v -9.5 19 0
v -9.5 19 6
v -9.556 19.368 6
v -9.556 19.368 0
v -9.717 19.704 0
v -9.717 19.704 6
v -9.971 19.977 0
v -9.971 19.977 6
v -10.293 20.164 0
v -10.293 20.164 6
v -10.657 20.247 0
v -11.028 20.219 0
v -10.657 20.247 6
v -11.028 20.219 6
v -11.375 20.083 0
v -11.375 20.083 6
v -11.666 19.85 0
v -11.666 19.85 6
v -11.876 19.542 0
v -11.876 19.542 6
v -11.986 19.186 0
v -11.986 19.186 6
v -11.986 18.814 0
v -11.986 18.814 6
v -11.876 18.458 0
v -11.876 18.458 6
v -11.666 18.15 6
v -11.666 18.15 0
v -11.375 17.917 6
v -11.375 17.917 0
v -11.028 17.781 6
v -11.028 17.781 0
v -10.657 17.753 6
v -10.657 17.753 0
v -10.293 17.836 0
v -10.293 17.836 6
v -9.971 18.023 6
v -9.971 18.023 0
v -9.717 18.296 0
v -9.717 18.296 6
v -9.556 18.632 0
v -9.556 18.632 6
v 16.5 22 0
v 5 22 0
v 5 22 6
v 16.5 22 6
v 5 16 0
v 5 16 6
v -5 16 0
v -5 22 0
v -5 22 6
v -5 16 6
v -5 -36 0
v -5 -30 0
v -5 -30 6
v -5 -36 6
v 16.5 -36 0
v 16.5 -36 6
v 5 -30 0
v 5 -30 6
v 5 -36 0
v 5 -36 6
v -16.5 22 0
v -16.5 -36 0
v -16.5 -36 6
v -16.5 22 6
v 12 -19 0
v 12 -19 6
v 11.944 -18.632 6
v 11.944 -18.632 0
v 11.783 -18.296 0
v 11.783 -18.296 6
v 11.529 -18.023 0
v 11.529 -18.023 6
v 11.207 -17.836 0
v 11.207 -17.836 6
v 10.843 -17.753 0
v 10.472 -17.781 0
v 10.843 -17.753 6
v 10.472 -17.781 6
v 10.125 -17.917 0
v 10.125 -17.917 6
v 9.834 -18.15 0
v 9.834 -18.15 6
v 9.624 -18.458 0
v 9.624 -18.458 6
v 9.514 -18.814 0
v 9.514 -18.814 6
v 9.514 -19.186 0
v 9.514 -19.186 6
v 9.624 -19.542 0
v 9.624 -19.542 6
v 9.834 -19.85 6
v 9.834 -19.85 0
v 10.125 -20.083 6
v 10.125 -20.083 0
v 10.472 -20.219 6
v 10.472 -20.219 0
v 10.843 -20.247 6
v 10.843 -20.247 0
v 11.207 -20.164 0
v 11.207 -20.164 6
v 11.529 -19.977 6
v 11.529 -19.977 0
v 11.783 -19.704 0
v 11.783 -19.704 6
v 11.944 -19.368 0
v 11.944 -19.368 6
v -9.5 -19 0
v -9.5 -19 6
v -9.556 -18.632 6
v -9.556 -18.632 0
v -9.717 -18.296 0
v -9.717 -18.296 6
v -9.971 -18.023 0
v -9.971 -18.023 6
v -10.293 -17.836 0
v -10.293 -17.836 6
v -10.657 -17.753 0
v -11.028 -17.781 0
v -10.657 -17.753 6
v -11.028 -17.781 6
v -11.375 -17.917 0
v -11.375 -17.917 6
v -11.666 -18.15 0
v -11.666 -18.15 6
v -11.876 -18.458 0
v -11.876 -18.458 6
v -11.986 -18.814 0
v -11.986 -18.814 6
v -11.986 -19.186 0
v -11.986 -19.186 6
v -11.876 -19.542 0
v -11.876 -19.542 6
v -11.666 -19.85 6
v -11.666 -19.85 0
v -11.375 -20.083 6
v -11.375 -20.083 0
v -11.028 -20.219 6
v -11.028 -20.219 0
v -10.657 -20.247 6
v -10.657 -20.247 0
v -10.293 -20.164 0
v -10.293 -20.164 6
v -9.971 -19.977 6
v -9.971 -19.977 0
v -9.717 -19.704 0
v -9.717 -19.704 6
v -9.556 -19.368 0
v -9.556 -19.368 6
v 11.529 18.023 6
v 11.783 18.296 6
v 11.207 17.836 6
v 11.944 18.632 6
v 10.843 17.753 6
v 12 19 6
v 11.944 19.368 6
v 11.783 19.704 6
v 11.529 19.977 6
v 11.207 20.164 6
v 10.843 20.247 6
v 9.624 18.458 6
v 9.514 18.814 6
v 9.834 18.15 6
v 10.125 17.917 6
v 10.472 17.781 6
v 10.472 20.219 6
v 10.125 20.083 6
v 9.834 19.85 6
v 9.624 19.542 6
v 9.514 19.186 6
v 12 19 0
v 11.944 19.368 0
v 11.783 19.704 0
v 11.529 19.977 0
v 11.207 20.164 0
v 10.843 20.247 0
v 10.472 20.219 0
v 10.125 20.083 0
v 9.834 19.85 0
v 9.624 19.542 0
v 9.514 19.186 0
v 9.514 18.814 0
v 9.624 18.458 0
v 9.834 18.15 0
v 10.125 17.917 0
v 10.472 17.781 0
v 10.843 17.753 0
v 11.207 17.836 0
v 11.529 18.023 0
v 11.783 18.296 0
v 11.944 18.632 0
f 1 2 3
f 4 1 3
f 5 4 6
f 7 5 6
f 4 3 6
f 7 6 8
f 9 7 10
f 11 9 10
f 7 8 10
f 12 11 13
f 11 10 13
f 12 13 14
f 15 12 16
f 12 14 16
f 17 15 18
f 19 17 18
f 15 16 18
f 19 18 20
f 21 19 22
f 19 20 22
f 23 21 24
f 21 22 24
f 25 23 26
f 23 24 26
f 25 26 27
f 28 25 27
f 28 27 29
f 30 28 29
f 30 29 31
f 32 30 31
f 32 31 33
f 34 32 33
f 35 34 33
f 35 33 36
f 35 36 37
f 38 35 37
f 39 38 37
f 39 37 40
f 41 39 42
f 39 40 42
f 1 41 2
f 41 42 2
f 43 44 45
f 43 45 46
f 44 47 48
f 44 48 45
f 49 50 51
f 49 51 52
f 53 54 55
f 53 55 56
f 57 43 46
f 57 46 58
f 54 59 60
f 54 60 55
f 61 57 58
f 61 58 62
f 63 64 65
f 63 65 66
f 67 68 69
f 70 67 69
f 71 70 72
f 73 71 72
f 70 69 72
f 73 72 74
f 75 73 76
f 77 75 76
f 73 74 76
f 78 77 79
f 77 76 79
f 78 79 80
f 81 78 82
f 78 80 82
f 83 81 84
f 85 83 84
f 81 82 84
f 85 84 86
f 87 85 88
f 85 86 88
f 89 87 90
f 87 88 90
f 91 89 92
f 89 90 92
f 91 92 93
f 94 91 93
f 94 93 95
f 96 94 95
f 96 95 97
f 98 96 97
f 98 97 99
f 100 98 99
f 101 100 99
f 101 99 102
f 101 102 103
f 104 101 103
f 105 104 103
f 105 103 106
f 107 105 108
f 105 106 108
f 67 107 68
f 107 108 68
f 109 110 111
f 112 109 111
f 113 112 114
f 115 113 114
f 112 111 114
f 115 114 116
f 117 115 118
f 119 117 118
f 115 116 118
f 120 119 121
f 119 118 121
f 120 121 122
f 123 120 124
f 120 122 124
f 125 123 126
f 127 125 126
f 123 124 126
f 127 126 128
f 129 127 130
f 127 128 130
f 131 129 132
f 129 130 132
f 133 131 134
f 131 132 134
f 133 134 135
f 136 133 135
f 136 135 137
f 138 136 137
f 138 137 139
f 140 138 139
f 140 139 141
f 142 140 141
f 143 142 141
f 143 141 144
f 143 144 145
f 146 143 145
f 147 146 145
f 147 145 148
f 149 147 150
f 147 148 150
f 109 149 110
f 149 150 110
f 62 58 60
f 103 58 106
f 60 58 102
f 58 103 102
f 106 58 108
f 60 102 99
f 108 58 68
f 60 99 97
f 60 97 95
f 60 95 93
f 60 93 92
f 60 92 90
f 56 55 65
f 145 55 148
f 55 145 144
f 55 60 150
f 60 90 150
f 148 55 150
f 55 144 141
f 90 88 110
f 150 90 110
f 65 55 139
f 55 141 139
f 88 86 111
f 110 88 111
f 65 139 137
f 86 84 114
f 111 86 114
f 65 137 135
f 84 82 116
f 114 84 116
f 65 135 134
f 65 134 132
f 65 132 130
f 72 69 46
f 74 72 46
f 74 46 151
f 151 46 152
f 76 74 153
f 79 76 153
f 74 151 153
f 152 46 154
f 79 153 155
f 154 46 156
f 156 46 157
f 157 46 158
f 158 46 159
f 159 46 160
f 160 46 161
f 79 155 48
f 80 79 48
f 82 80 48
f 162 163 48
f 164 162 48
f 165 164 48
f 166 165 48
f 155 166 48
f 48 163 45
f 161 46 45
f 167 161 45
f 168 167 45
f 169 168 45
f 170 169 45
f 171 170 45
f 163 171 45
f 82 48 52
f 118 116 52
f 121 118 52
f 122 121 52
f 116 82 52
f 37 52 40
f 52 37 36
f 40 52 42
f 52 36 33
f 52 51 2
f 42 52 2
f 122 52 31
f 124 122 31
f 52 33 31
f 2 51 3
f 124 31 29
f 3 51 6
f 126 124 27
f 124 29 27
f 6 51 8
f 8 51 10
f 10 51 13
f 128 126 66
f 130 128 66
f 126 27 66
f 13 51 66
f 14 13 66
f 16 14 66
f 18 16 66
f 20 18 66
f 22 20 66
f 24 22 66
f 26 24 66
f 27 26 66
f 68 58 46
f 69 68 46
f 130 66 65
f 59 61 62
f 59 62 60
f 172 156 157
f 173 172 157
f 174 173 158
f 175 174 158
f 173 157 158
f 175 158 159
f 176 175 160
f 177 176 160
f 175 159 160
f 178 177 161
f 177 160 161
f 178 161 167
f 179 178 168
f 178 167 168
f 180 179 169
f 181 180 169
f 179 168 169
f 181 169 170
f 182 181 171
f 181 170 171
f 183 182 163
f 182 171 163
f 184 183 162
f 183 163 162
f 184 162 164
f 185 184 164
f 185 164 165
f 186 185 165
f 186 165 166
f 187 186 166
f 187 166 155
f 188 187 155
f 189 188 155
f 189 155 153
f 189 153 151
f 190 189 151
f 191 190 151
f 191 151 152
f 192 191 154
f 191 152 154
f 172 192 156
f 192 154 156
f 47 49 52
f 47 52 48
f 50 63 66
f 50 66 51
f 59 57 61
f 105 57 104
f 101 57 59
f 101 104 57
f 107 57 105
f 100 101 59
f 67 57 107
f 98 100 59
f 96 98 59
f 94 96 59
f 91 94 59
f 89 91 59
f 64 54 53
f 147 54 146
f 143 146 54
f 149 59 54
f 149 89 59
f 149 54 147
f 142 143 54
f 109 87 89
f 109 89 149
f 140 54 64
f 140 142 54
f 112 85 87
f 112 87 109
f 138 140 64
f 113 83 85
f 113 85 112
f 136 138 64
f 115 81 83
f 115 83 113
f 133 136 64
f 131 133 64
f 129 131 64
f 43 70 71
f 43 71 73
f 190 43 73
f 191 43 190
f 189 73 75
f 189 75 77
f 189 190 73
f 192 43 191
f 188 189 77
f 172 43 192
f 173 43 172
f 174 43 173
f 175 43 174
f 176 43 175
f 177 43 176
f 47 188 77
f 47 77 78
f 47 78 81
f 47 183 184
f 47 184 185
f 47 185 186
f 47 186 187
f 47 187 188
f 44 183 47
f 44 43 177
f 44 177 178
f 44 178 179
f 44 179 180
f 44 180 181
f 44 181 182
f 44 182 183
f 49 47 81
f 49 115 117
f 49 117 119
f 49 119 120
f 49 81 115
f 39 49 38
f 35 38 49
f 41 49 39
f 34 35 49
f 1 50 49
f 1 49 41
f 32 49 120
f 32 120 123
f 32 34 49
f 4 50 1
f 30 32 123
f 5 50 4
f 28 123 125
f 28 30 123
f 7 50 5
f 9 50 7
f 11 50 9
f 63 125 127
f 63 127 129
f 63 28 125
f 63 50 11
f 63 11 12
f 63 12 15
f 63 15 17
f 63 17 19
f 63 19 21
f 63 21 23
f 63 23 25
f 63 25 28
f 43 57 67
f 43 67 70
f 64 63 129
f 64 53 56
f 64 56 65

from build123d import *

# Parameters (mm, degrees)
BOSS_EXTRU_1_DEPTH      = 6
ESQUISSE2_R             = 1.25
ENL_V_MAT_EXTRU_1_DEPTH = 6


with BuildPart() as part:
    # Esquisse1 → Boss.-Extru.1 (new body)
    with BuildSketch(Plane.XY):
        Polygon((-16.5, 22), (-5, 22), (-5, 16), (5, 16), (5, 22), (16.5, 22), (16.5, -36), (5, -36), (5, -30), (-5, -30), (-5, -36), (-16.5, -36), align=None)
    extrude(amount=BOSS_EXTRU_1_DEPTH)

    # Esquisse2 → Enlèv. mat.-Extru.1 (cut)
    with BuildSketch(Plane.XY.offset(6)):
        with Locations((-10.75, 19)):
            Circle(ESQUISSE2_R)
        with Locations((10.75, 19)):
            Circle(ESQUISSE2_R)
        with Locations((10.75, -19)):
            Circle(ESQUISSE2_R)
        with Locations((-10.75, -19)):
            Circle(ESQUISSE2_R)
    extrude(amount=-ENL_V_MAT_EXTRU_1_DEPTH, mode=Mode.SUBTRACT)


solid = part.part
